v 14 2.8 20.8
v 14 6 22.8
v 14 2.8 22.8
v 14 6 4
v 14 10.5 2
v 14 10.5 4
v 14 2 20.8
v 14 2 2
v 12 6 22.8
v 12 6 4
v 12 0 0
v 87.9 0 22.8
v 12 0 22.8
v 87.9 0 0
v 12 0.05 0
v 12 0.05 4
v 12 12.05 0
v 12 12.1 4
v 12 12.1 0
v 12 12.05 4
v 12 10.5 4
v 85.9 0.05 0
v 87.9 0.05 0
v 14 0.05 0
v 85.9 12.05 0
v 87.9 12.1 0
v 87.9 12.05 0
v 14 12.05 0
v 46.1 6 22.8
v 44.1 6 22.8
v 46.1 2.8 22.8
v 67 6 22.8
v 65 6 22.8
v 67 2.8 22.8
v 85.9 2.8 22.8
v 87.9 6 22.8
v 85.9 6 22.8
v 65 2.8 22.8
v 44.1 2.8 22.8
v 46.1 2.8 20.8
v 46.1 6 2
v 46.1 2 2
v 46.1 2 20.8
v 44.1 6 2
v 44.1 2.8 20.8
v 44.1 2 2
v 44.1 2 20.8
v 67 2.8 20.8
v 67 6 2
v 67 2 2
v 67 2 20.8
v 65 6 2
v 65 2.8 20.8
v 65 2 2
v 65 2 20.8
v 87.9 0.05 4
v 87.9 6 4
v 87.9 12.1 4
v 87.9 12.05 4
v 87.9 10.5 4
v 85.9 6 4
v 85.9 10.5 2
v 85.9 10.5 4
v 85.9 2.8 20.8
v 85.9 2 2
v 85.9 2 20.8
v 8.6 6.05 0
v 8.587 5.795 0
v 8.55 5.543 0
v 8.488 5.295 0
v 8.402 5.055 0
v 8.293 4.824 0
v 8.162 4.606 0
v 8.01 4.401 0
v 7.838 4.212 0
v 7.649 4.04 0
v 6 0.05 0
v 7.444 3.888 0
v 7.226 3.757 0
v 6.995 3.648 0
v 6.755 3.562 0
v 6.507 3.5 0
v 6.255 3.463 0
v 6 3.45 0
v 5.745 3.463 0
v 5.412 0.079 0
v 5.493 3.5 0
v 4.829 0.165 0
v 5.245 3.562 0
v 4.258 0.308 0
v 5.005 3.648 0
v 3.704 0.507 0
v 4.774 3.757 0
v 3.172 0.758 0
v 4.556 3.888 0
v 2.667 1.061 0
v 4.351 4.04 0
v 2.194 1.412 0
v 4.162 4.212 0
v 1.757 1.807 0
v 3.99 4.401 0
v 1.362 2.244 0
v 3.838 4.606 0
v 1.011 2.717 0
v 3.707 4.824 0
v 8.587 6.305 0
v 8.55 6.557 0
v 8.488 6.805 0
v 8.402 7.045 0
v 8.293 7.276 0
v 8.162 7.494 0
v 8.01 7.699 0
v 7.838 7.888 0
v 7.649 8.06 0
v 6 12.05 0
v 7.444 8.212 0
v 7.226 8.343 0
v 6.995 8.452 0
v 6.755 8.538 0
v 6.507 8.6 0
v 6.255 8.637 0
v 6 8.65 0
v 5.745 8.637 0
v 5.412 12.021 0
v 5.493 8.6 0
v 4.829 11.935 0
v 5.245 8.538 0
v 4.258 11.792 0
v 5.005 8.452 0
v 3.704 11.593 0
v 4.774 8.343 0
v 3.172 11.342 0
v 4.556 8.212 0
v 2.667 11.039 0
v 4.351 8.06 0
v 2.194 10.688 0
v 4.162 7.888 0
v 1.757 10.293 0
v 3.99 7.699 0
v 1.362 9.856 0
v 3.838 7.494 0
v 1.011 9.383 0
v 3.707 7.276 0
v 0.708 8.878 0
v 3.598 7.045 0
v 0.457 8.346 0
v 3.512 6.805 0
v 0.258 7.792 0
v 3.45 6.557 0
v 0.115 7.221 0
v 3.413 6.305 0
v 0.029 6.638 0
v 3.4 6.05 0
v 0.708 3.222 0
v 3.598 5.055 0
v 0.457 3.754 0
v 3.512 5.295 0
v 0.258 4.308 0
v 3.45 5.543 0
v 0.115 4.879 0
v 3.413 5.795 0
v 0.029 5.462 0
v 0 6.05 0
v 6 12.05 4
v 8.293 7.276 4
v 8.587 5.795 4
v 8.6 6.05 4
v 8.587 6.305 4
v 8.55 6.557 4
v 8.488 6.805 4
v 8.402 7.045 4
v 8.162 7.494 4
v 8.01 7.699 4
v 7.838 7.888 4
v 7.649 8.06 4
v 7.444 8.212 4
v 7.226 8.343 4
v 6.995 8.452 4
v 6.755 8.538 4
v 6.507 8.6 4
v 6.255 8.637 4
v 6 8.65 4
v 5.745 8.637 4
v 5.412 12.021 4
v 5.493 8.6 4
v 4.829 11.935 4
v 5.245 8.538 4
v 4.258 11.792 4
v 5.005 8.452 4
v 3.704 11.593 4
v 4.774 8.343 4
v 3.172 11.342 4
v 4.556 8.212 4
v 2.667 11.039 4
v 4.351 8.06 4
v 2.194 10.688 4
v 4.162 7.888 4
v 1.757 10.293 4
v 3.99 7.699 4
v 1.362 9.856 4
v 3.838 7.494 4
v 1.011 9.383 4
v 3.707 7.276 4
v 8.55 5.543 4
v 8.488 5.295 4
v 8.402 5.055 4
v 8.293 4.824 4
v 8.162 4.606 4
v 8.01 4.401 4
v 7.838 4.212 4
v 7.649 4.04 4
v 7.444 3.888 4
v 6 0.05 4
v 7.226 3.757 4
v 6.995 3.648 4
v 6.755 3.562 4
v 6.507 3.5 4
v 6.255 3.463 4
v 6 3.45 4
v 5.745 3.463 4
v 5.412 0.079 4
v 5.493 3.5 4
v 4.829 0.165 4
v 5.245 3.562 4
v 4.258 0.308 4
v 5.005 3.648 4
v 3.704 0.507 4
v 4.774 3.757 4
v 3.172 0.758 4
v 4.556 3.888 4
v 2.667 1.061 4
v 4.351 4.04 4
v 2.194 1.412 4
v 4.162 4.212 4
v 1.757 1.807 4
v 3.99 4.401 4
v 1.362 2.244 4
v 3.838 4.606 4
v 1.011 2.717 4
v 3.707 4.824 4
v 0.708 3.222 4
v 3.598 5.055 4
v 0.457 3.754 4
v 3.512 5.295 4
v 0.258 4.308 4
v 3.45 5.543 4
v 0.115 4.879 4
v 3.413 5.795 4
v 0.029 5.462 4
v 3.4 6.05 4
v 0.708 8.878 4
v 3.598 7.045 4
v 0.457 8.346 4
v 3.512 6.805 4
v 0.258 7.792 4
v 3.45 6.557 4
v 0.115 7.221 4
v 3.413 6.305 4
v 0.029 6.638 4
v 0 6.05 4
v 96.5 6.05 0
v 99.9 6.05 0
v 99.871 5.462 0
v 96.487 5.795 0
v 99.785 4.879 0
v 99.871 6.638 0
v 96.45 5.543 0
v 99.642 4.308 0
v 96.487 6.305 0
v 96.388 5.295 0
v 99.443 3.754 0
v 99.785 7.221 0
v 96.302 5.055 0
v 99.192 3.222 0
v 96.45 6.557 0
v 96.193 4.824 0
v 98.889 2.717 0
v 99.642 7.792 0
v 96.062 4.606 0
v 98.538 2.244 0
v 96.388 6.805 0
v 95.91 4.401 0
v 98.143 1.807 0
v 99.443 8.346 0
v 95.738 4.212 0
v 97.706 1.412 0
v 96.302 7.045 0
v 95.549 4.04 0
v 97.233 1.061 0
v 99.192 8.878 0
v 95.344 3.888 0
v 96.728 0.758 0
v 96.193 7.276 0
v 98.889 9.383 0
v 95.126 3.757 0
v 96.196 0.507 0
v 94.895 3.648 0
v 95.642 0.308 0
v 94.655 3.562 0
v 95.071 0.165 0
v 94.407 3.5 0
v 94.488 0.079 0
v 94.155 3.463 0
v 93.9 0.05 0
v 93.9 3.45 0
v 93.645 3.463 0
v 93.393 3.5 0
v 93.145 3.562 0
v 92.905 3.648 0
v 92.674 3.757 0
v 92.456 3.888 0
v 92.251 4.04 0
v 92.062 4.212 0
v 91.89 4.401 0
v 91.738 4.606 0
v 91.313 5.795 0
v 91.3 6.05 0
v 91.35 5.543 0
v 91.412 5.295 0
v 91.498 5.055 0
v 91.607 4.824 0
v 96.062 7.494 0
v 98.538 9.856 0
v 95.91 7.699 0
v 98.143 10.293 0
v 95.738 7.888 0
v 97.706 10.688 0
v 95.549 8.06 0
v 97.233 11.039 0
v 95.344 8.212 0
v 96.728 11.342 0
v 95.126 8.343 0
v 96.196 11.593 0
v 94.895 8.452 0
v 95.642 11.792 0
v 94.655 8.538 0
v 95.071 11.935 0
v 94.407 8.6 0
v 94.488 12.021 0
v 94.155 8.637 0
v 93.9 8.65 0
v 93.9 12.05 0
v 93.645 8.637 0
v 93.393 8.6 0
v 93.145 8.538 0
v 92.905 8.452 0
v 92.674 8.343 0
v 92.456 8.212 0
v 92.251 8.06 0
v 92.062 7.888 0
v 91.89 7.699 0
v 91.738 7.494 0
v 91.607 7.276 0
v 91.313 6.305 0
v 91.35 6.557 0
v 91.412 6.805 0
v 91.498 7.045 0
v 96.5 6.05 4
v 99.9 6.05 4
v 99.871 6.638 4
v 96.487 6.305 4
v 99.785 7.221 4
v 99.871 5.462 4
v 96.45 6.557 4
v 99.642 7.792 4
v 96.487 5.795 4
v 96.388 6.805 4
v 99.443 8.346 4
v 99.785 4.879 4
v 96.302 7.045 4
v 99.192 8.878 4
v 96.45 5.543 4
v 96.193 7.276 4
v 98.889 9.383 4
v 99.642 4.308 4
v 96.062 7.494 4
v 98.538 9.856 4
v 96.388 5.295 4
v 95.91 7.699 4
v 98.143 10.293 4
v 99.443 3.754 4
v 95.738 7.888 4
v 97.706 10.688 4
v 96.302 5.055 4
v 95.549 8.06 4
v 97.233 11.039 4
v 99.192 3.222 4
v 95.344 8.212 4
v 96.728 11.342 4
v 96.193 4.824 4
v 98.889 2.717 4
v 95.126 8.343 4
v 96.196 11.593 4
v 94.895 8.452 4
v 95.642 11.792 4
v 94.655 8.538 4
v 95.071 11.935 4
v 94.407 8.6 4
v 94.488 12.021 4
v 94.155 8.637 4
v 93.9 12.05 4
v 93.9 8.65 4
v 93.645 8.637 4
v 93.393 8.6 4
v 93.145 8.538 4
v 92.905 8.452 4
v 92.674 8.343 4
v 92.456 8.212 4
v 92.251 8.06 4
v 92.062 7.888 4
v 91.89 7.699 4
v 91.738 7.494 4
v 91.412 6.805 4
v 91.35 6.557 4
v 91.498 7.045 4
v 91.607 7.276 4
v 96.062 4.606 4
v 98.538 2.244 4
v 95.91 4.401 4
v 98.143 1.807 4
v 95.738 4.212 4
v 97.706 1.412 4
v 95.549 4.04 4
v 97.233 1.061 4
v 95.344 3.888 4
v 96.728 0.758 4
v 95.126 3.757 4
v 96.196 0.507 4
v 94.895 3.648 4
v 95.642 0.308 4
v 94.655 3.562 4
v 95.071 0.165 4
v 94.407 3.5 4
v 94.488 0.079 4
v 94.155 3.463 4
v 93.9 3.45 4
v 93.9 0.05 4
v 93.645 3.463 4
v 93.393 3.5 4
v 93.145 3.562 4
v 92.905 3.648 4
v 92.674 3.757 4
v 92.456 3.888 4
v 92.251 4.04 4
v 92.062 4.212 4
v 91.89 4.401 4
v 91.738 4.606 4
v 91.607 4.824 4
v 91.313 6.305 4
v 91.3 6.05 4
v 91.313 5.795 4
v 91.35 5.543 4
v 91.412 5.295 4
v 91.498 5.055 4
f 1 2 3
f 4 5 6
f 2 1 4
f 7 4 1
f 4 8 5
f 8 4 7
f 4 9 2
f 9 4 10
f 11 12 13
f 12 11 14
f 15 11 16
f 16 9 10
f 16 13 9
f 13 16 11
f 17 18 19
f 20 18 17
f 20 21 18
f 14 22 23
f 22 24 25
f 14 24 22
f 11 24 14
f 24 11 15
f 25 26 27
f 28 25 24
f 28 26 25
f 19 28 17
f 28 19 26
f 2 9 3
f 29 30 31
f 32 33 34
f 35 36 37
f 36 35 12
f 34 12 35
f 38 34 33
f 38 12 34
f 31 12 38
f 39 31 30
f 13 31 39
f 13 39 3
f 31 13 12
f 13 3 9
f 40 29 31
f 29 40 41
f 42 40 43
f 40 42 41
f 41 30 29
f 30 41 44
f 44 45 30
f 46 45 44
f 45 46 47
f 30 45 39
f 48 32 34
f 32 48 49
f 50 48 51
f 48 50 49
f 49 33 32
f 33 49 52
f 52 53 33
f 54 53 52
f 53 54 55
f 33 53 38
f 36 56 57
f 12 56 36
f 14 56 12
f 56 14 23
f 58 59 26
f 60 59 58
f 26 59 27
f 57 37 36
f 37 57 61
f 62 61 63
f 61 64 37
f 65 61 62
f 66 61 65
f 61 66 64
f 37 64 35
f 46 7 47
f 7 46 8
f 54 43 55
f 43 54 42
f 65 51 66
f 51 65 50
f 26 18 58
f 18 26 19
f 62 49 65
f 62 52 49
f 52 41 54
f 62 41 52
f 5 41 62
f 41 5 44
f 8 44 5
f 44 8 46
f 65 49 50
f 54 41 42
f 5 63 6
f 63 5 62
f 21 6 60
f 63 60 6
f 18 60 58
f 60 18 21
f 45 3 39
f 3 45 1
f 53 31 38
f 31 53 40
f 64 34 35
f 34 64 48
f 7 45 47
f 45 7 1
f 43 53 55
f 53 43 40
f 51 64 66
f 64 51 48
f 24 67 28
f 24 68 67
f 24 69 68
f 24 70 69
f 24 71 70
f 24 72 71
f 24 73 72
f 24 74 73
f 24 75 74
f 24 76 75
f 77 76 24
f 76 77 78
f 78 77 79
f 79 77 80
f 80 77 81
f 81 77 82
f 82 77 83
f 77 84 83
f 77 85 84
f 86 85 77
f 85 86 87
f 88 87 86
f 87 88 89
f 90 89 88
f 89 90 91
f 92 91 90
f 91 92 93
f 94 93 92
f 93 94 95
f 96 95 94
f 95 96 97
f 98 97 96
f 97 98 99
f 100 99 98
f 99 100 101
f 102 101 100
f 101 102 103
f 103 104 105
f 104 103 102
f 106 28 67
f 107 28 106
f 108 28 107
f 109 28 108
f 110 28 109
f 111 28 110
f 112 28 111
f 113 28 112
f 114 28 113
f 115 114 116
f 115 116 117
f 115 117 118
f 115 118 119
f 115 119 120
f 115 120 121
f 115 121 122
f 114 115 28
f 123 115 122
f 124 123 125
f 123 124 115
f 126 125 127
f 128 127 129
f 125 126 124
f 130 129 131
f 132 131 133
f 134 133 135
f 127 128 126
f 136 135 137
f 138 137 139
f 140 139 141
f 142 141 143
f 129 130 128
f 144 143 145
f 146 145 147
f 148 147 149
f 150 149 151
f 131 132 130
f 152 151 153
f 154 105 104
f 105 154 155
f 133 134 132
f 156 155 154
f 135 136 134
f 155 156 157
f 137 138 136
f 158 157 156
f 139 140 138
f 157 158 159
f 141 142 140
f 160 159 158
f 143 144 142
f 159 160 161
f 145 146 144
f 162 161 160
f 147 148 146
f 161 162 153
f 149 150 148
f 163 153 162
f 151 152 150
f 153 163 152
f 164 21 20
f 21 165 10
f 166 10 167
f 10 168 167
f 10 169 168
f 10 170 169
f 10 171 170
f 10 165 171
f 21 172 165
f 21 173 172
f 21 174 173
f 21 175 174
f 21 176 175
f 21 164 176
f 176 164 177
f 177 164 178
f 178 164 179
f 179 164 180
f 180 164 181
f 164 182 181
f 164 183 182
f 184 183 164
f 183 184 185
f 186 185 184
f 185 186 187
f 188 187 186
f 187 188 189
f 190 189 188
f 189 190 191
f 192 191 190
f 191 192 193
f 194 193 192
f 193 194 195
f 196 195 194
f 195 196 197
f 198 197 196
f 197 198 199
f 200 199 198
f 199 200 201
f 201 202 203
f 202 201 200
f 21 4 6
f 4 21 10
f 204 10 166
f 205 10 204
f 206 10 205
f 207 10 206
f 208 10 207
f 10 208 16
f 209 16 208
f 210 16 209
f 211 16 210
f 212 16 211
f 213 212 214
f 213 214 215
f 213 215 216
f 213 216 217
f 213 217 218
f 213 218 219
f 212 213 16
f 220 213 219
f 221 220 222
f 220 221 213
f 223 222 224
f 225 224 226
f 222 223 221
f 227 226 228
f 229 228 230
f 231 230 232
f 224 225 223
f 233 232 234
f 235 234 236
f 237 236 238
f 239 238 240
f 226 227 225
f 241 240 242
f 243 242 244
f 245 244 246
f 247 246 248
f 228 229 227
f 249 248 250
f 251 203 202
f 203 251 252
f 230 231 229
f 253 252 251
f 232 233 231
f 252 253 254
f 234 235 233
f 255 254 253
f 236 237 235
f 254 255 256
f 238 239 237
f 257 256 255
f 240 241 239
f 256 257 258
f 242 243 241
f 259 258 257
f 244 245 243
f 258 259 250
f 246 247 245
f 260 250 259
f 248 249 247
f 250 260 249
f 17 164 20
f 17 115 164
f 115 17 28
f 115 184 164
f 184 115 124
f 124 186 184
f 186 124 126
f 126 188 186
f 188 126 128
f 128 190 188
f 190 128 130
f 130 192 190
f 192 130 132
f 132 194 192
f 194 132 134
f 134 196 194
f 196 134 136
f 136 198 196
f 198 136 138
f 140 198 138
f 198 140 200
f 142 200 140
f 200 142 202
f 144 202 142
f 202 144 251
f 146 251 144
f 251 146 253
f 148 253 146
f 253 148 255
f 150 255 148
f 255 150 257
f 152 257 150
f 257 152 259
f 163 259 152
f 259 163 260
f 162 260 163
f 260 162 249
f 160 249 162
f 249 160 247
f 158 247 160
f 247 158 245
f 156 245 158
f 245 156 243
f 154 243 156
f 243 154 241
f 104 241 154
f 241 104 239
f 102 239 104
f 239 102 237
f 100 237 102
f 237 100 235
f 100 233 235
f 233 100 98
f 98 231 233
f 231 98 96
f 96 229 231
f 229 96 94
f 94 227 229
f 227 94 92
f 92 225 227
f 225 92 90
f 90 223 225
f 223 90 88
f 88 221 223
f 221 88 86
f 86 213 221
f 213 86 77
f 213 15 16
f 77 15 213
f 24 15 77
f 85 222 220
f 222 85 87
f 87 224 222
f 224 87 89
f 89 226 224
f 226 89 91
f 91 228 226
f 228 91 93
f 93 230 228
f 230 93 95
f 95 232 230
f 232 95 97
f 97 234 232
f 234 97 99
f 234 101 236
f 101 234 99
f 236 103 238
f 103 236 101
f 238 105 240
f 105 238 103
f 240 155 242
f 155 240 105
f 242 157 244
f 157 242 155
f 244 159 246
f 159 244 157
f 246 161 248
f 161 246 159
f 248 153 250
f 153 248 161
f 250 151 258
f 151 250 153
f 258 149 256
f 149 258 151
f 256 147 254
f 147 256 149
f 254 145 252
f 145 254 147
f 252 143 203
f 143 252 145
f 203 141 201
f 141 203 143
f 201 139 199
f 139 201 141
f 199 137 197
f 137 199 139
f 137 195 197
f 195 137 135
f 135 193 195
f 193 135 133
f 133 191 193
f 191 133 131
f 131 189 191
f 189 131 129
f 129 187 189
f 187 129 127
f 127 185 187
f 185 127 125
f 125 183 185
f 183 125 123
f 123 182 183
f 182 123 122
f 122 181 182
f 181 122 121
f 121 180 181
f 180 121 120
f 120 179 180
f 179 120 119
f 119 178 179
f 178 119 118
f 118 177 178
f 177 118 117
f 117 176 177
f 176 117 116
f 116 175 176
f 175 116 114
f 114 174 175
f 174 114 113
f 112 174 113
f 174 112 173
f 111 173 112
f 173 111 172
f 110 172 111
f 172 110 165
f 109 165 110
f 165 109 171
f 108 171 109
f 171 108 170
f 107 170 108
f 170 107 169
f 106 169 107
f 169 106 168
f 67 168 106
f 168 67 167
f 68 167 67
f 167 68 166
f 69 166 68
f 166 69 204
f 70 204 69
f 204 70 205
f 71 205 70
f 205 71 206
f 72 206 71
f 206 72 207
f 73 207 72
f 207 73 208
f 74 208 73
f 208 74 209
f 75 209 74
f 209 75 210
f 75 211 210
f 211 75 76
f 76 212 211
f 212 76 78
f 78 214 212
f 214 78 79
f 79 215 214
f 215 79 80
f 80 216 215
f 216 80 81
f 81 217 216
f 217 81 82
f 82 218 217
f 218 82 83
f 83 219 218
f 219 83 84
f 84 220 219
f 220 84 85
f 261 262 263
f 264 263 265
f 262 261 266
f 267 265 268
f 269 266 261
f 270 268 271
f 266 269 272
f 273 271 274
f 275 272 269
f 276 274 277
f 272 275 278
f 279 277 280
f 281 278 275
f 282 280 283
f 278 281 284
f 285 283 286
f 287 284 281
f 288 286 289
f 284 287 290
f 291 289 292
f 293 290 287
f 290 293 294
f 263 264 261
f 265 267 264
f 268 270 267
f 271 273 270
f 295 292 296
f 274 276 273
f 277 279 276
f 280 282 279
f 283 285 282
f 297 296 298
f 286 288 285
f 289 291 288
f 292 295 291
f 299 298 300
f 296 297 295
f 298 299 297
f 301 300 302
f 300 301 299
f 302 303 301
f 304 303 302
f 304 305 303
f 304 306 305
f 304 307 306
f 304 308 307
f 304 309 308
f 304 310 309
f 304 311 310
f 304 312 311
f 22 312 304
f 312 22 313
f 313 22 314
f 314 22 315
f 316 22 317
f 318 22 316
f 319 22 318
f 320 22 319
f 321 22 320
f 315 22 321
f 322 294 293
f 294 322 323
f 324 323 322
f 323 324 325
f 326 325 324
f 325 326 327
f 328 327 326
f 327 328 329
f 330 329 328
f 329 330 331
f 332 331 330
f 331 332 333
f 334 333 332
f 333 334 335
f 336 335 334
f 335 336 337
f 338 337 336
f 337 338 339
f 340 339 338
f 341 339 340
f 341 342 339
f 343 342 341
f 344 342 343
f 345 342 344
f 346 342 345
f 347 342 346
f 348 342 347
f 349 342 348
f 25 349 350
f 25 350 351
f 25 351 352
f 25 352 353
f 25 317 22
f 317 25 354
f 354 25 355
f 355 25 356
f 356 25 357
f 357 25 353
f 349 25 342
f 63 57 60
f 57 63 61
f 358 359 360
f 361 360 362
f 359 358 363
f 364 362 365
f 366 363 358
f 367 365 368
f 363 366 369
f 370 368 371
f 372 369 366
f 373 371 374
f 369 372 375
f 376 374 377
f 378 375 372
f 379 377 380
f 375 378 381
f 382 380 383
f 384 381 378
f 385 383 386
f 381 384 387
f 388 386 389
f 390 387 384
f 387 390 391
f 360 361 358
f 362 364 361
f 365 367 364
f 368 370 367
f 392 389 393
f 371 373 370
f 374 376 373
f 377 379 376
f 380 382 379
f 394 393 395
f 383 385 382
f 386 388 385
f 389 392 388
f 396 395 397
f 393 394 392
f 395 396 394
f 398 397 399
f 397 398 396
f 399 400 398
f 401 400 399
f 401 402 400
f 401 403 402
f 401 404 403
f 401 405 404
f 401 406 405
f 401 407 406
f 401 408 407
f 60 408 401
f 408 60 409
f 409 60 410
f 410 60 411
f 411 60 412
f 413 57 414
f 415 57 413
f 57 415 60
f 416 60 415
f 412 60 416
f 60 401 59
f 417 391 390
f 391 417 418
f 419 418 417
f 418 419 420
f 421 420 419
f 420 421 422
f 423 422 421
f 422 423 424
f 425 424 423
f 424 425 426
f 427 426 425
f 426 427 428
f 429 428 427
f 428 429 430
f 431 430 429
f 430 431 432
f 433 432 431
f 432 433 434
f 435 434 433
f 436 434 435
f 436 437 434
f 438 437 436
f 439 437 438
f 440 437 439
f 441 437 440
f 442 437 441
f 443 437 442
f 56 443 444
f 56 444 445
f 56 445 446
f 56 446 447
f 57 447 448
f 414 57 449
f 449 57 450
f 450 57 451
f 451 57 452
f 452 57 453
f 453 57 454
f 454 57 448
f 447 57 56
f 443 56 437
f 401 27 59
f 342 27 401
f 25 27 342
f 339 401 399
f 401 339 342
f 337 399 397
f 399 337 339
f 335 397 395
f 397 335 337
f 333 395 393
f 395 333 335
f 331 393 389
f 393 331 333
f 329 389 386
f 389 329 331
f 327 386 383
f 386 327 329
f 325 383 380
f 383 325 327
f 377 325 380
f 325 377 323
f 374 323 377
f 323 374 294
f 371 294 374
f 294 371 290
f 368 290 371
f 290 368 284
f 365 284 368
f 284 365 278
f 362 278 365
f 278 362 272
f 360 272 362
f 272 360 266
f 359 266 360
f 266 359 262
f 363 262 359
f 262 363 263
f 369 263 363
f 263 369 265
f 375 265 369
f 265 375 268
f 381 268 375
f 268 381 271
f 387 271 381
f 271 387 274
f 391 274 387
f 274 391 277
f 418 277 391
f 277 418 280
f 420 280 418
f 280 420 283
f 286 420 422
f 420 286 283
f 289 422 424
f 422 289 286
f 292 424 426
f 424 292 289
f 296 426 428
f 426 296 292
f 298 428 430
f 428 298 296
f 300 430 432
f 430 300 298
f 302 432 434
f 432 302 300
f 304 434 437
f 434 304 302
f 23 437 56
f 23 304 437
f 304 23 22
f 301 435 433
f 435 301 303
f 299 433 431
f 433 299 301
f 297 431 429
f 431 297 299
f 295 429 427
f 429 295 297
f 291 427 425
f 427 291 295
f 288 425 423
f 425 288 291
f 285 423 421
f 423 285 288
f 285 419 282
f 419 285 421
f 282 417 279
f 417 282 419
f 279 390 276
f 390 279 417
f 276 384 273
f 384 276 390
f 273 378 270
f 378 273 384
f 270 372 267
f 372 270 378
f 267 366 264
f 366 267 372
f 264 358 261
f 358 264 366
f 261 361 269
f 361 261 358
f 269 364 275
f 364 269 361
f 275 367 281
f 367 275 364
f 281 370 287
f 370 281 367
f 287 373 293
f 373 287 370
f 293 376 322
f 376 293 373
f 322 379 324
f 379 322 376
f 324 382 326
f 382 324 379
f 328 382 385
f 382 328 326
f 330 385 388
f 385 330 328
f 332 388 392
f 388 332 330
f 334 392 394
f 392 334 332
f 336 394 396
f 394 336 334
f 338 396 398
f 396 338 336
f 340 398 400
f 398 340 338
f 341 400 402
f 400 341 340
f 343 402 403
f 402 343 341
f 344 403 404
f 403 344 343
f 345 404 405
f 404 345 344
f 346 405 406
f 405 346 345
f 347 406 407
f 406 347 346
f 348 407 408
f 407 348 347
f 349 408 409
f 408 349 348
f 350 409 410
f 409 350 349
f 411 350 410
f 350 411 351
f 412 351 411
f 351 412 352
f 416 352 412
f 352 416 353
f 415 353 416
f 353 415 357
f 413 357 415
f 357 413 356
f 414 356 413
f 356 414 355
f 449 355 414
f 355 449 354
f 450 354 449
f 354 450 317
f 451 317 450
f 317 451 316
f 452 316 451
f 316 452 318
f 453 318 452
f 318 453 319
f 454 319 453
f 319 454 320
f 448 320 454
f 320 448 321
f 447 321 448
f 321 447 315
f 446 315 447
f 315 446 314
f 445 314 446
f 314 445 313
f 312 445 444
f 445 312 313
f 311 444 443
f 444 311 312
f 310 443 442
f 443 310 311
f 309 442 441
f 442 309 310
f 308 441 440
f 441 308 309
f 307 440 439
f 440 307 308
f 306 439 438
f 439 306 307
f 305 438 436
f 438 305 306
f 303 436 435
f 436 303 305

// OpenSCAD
// file: ../lever_nut_holder.scad
// Lever-nut holder: a printable tray for WAGO 221 lever connectors, one slot
// per connector, in one row or two back to back, lying flat or standing up,
// with a screw tab at each end. MIT licence; see LICENSE.

/* [Holder] */

// Conductors per connector, one entry per slot: 2, 3 or 5 for the 221-412, 221-413 and 221-415
blocks_config = [2, 2, 2, 2, 2];

// One row or two back to back, lying flat (wires leave sideways) or standing up (wires leave upward)
style_config = "horizontal_mirrored"; // [horizontal, horizontal_mirrored, vertical, vertical_mirrored]

/* [Screw tabs] */

tabs = true;

// Length and width of each tab, mm
tab_width = 10;

// Radius of the screw hole, mm
tab_radius = 2.6;

// Thickness of each tab, mm
tab_height = 4;

/* [Fit] */

// Clearance added to the connector's width, depth and height, mm
allowance = 0.2;

/* [Hidden] */

// "holder", or for the checks: "fit" (the holder where it meets connectors at
// datasheet size; empty when they fit) and "grip" (where it meets connectors
// 1 mm taller; the lips that hold them down)
part = "holder";

$fn = $preview ? 32 : 64;

// WAGO 221 sizes from its datasheets, mm. The width grows 5.6 mm per
// conductor: 13.1 for the 221-412, 18.7 for the 221-413, 29.9 for the 221-415.
function connector_width(n) = 1.9 + 5.6 * n;
connector_depth = 18.6;
connector_height = 8.3;

wall = 2;        // rails and back wall
floor_t = 2;     // under the connectors
lip_t = 1.6;     // thickness of the lip over the back edge
back_lip = 2;    // how far the lip reaches over the connector
front_stop = 0.8; // height of the front stop above the floor
rail = 4;        // height of the side rails above the floor

STYLES = ["horizontal", "horizontal_mirrored", "vertical", "vertical_mirrored"];

function slot_width(n, a) = connector_width(n) + a;
// x of slot i's left side, and the row's length with a rail at each end.
function slot_x(blocks, a, i) =
  i == 0 ? wall : slot_x(blocks, a, i - 1) + slot_width(blocks[i - 1], a) + wall;
function row_length(blocks, a) = slot_x(blocks, a, len(blocks));

// One row, front at y = 0, back wall at y = depth, floor at z = 0.
module row(blocks, a) {
  d = connector_depth + a;
  h = connector_height + a;
  length = row_length(blocks, a);
  translate([0, -wall, 0]) cube([length, d + 2 * wall, floor_t]);
  translate([0, d, 0]) cube([length, wall, floor_t + h + lip_t]);
  translate([0, d - back_lip, floor_t + h]) cube([length, back_lip + wall, lip_t]);
  translate([0, -wall, 0]) cube([length, wall, floor_t + front_stop]);
  for (i = [0:len(blocks)])
    translate([slot_x(blocks, a, i) - wall, -wall, 0])
      cube([wall, d + 2 * wall, floor_t + rail]);
}

// Connectors at datasheet size in a row's slots, optionally made taller. They
// are 0.01 mm smaller on every face, so resting on the floor doesn't count as
// meeting the holder.
module connectors(blocks, a, grow = 0) {
  e = 0.01;
  for (i = [0:len(blocks) - 1])
    translate([slot_x(blocks, a, i) + a / 2 + e, a / 2 + e, floor_t + e])
      cube([connector_width(blocks[i]) - 2 * e, connector_depth - 2 * e, connector_height + grow - 2 * e]);
}

// Places its child, a row, in the chosen style, with the part on z = 0 and
// starting at x = 0, y = 0. Adds the screw tabs when asked.
module arrange(blocks, style, a, tabs, tab_width, tab_radius, tab_height, with_tabs) {
  d = connector_depth + a;
  h = floor_t + connector_height + a + lip_t;
  length = row_length(blocks, a);
  shift = tabs ? tab_width : 0;
  upright = style == "vertical" || style == "vertical_mirrored";
  double = style == "horizontal_mirrored" || style == "vertical_mirrored";
  // Where the tabs' centres sit across the part.
  tab_y =
    !upright ? (double ? d + 1.5 * wall : (d + 2 * wall) / 2)
    : (double ? h - floor_t / 2 : h / 2);

  translate([shift, 0, 0]) {
    if (!upright) {
      translate([0, wall, 0]) {
        children();
        // The second row turns about the back wall, so the two share it.
        if (double) translate([0, 2 * d + wall, 0]) mirror([0, 1, 0]) children();
      }
    } else {
      // Standing on the back wall: the floor is upright and wires leave upward.
      lift = double ? h - floor_t : 0;
      translate([0, lift, d + wall]) {
        rotate([-90, 0, 0]) children();
        // The second row turns about the floor, so the two share it.
        if (double) translate([0, floor_t, 0]) mirror([0, 1, 0]) rotate([-90, 0, 0]) children();
      }
    }
    if (tabs && with_tabs) {
      translate([0, tab_y, 0]) tab(tab_width, tab_radius, tab_height);
      translate([length, tab_y, 0]) mirror([1, 0, 0]) tab(tab_width, tab_radius, tab_height);
    }
  }
}

// A screw tab reaching out from x = 0 towards -x, centred on y = 0. It runs
// under the end rail so it joins the row.
module tab(width, radius, thickness) {
  linear_extrude(thickness) difference() {
    hull() {
      translate([-width / 2, 0]) circle(d = width);
      translate([-width / 2, -width / 2]) square([width / 2 + wall, width]);
    }
    translate([-width / 2, 0]) circle(r = radius);
  }
}

module lever_nut_holder(
  blocks = [2, 2, 2, 2, 2],
  style = "horizontal_mirrored",
  tabs = true,
  tab_width = 10,
  tab_radius = 2.6,
  tab_height = 4,
  allowance = 0.2
) {
  assert(len(blocks) > 0, "lever_nut_holder: blocks needs at least one connector");
  assert(len([for (n = blocks) if (n != floor(n) || n < 1) n]) == 0,
         str("lever_nut_holder: each entry in blocks is a whole number of conductors, got ", blocks));
  assert(len([for (s = STYLES) if (s == style) s]) == 1,
         str("lever_nut_holder: style is one of ", STYLES, ", got ", style));
  assert(!tabs || tab_radius < tab_width / 2,
         "lever_nut_holder: tab_radius has to be less than half of tab_width");
  arrange(blocks, style, allowance, tabs, tab_width, tab_radius, tab_height, true)
    row(blocks, allowance);
}

module checked_part(grow) {
  intersection() {
    lever_nut_holder(blocks_config, style_config, tabs, tab_width, tab_radius, tab_height, allowance);
    arrange(blocks_config, style_config, allowance, tabs, tab_width, tab_radius, tab_height, false)
      connectors(blocks_config, allowance, grow);
  }
}

if (part == "fit") checked_part(0);
else if (part == "grip") checked_part(1);
else lever_nut_holder(blocks_config, style_config, tabs, tab_width, tab_radius, tab_height, allowance);
// main file
// A standing holder for one 221-415 and two 221-413s, built from another file
use <../lever_nut_holder.scad>

// A used file's $fn doesn't reach its modules, so set it here.
$fn = 64;

lever_nut_holder(blocks=[5, 3, 3], style="vertical", tab_width=12);
